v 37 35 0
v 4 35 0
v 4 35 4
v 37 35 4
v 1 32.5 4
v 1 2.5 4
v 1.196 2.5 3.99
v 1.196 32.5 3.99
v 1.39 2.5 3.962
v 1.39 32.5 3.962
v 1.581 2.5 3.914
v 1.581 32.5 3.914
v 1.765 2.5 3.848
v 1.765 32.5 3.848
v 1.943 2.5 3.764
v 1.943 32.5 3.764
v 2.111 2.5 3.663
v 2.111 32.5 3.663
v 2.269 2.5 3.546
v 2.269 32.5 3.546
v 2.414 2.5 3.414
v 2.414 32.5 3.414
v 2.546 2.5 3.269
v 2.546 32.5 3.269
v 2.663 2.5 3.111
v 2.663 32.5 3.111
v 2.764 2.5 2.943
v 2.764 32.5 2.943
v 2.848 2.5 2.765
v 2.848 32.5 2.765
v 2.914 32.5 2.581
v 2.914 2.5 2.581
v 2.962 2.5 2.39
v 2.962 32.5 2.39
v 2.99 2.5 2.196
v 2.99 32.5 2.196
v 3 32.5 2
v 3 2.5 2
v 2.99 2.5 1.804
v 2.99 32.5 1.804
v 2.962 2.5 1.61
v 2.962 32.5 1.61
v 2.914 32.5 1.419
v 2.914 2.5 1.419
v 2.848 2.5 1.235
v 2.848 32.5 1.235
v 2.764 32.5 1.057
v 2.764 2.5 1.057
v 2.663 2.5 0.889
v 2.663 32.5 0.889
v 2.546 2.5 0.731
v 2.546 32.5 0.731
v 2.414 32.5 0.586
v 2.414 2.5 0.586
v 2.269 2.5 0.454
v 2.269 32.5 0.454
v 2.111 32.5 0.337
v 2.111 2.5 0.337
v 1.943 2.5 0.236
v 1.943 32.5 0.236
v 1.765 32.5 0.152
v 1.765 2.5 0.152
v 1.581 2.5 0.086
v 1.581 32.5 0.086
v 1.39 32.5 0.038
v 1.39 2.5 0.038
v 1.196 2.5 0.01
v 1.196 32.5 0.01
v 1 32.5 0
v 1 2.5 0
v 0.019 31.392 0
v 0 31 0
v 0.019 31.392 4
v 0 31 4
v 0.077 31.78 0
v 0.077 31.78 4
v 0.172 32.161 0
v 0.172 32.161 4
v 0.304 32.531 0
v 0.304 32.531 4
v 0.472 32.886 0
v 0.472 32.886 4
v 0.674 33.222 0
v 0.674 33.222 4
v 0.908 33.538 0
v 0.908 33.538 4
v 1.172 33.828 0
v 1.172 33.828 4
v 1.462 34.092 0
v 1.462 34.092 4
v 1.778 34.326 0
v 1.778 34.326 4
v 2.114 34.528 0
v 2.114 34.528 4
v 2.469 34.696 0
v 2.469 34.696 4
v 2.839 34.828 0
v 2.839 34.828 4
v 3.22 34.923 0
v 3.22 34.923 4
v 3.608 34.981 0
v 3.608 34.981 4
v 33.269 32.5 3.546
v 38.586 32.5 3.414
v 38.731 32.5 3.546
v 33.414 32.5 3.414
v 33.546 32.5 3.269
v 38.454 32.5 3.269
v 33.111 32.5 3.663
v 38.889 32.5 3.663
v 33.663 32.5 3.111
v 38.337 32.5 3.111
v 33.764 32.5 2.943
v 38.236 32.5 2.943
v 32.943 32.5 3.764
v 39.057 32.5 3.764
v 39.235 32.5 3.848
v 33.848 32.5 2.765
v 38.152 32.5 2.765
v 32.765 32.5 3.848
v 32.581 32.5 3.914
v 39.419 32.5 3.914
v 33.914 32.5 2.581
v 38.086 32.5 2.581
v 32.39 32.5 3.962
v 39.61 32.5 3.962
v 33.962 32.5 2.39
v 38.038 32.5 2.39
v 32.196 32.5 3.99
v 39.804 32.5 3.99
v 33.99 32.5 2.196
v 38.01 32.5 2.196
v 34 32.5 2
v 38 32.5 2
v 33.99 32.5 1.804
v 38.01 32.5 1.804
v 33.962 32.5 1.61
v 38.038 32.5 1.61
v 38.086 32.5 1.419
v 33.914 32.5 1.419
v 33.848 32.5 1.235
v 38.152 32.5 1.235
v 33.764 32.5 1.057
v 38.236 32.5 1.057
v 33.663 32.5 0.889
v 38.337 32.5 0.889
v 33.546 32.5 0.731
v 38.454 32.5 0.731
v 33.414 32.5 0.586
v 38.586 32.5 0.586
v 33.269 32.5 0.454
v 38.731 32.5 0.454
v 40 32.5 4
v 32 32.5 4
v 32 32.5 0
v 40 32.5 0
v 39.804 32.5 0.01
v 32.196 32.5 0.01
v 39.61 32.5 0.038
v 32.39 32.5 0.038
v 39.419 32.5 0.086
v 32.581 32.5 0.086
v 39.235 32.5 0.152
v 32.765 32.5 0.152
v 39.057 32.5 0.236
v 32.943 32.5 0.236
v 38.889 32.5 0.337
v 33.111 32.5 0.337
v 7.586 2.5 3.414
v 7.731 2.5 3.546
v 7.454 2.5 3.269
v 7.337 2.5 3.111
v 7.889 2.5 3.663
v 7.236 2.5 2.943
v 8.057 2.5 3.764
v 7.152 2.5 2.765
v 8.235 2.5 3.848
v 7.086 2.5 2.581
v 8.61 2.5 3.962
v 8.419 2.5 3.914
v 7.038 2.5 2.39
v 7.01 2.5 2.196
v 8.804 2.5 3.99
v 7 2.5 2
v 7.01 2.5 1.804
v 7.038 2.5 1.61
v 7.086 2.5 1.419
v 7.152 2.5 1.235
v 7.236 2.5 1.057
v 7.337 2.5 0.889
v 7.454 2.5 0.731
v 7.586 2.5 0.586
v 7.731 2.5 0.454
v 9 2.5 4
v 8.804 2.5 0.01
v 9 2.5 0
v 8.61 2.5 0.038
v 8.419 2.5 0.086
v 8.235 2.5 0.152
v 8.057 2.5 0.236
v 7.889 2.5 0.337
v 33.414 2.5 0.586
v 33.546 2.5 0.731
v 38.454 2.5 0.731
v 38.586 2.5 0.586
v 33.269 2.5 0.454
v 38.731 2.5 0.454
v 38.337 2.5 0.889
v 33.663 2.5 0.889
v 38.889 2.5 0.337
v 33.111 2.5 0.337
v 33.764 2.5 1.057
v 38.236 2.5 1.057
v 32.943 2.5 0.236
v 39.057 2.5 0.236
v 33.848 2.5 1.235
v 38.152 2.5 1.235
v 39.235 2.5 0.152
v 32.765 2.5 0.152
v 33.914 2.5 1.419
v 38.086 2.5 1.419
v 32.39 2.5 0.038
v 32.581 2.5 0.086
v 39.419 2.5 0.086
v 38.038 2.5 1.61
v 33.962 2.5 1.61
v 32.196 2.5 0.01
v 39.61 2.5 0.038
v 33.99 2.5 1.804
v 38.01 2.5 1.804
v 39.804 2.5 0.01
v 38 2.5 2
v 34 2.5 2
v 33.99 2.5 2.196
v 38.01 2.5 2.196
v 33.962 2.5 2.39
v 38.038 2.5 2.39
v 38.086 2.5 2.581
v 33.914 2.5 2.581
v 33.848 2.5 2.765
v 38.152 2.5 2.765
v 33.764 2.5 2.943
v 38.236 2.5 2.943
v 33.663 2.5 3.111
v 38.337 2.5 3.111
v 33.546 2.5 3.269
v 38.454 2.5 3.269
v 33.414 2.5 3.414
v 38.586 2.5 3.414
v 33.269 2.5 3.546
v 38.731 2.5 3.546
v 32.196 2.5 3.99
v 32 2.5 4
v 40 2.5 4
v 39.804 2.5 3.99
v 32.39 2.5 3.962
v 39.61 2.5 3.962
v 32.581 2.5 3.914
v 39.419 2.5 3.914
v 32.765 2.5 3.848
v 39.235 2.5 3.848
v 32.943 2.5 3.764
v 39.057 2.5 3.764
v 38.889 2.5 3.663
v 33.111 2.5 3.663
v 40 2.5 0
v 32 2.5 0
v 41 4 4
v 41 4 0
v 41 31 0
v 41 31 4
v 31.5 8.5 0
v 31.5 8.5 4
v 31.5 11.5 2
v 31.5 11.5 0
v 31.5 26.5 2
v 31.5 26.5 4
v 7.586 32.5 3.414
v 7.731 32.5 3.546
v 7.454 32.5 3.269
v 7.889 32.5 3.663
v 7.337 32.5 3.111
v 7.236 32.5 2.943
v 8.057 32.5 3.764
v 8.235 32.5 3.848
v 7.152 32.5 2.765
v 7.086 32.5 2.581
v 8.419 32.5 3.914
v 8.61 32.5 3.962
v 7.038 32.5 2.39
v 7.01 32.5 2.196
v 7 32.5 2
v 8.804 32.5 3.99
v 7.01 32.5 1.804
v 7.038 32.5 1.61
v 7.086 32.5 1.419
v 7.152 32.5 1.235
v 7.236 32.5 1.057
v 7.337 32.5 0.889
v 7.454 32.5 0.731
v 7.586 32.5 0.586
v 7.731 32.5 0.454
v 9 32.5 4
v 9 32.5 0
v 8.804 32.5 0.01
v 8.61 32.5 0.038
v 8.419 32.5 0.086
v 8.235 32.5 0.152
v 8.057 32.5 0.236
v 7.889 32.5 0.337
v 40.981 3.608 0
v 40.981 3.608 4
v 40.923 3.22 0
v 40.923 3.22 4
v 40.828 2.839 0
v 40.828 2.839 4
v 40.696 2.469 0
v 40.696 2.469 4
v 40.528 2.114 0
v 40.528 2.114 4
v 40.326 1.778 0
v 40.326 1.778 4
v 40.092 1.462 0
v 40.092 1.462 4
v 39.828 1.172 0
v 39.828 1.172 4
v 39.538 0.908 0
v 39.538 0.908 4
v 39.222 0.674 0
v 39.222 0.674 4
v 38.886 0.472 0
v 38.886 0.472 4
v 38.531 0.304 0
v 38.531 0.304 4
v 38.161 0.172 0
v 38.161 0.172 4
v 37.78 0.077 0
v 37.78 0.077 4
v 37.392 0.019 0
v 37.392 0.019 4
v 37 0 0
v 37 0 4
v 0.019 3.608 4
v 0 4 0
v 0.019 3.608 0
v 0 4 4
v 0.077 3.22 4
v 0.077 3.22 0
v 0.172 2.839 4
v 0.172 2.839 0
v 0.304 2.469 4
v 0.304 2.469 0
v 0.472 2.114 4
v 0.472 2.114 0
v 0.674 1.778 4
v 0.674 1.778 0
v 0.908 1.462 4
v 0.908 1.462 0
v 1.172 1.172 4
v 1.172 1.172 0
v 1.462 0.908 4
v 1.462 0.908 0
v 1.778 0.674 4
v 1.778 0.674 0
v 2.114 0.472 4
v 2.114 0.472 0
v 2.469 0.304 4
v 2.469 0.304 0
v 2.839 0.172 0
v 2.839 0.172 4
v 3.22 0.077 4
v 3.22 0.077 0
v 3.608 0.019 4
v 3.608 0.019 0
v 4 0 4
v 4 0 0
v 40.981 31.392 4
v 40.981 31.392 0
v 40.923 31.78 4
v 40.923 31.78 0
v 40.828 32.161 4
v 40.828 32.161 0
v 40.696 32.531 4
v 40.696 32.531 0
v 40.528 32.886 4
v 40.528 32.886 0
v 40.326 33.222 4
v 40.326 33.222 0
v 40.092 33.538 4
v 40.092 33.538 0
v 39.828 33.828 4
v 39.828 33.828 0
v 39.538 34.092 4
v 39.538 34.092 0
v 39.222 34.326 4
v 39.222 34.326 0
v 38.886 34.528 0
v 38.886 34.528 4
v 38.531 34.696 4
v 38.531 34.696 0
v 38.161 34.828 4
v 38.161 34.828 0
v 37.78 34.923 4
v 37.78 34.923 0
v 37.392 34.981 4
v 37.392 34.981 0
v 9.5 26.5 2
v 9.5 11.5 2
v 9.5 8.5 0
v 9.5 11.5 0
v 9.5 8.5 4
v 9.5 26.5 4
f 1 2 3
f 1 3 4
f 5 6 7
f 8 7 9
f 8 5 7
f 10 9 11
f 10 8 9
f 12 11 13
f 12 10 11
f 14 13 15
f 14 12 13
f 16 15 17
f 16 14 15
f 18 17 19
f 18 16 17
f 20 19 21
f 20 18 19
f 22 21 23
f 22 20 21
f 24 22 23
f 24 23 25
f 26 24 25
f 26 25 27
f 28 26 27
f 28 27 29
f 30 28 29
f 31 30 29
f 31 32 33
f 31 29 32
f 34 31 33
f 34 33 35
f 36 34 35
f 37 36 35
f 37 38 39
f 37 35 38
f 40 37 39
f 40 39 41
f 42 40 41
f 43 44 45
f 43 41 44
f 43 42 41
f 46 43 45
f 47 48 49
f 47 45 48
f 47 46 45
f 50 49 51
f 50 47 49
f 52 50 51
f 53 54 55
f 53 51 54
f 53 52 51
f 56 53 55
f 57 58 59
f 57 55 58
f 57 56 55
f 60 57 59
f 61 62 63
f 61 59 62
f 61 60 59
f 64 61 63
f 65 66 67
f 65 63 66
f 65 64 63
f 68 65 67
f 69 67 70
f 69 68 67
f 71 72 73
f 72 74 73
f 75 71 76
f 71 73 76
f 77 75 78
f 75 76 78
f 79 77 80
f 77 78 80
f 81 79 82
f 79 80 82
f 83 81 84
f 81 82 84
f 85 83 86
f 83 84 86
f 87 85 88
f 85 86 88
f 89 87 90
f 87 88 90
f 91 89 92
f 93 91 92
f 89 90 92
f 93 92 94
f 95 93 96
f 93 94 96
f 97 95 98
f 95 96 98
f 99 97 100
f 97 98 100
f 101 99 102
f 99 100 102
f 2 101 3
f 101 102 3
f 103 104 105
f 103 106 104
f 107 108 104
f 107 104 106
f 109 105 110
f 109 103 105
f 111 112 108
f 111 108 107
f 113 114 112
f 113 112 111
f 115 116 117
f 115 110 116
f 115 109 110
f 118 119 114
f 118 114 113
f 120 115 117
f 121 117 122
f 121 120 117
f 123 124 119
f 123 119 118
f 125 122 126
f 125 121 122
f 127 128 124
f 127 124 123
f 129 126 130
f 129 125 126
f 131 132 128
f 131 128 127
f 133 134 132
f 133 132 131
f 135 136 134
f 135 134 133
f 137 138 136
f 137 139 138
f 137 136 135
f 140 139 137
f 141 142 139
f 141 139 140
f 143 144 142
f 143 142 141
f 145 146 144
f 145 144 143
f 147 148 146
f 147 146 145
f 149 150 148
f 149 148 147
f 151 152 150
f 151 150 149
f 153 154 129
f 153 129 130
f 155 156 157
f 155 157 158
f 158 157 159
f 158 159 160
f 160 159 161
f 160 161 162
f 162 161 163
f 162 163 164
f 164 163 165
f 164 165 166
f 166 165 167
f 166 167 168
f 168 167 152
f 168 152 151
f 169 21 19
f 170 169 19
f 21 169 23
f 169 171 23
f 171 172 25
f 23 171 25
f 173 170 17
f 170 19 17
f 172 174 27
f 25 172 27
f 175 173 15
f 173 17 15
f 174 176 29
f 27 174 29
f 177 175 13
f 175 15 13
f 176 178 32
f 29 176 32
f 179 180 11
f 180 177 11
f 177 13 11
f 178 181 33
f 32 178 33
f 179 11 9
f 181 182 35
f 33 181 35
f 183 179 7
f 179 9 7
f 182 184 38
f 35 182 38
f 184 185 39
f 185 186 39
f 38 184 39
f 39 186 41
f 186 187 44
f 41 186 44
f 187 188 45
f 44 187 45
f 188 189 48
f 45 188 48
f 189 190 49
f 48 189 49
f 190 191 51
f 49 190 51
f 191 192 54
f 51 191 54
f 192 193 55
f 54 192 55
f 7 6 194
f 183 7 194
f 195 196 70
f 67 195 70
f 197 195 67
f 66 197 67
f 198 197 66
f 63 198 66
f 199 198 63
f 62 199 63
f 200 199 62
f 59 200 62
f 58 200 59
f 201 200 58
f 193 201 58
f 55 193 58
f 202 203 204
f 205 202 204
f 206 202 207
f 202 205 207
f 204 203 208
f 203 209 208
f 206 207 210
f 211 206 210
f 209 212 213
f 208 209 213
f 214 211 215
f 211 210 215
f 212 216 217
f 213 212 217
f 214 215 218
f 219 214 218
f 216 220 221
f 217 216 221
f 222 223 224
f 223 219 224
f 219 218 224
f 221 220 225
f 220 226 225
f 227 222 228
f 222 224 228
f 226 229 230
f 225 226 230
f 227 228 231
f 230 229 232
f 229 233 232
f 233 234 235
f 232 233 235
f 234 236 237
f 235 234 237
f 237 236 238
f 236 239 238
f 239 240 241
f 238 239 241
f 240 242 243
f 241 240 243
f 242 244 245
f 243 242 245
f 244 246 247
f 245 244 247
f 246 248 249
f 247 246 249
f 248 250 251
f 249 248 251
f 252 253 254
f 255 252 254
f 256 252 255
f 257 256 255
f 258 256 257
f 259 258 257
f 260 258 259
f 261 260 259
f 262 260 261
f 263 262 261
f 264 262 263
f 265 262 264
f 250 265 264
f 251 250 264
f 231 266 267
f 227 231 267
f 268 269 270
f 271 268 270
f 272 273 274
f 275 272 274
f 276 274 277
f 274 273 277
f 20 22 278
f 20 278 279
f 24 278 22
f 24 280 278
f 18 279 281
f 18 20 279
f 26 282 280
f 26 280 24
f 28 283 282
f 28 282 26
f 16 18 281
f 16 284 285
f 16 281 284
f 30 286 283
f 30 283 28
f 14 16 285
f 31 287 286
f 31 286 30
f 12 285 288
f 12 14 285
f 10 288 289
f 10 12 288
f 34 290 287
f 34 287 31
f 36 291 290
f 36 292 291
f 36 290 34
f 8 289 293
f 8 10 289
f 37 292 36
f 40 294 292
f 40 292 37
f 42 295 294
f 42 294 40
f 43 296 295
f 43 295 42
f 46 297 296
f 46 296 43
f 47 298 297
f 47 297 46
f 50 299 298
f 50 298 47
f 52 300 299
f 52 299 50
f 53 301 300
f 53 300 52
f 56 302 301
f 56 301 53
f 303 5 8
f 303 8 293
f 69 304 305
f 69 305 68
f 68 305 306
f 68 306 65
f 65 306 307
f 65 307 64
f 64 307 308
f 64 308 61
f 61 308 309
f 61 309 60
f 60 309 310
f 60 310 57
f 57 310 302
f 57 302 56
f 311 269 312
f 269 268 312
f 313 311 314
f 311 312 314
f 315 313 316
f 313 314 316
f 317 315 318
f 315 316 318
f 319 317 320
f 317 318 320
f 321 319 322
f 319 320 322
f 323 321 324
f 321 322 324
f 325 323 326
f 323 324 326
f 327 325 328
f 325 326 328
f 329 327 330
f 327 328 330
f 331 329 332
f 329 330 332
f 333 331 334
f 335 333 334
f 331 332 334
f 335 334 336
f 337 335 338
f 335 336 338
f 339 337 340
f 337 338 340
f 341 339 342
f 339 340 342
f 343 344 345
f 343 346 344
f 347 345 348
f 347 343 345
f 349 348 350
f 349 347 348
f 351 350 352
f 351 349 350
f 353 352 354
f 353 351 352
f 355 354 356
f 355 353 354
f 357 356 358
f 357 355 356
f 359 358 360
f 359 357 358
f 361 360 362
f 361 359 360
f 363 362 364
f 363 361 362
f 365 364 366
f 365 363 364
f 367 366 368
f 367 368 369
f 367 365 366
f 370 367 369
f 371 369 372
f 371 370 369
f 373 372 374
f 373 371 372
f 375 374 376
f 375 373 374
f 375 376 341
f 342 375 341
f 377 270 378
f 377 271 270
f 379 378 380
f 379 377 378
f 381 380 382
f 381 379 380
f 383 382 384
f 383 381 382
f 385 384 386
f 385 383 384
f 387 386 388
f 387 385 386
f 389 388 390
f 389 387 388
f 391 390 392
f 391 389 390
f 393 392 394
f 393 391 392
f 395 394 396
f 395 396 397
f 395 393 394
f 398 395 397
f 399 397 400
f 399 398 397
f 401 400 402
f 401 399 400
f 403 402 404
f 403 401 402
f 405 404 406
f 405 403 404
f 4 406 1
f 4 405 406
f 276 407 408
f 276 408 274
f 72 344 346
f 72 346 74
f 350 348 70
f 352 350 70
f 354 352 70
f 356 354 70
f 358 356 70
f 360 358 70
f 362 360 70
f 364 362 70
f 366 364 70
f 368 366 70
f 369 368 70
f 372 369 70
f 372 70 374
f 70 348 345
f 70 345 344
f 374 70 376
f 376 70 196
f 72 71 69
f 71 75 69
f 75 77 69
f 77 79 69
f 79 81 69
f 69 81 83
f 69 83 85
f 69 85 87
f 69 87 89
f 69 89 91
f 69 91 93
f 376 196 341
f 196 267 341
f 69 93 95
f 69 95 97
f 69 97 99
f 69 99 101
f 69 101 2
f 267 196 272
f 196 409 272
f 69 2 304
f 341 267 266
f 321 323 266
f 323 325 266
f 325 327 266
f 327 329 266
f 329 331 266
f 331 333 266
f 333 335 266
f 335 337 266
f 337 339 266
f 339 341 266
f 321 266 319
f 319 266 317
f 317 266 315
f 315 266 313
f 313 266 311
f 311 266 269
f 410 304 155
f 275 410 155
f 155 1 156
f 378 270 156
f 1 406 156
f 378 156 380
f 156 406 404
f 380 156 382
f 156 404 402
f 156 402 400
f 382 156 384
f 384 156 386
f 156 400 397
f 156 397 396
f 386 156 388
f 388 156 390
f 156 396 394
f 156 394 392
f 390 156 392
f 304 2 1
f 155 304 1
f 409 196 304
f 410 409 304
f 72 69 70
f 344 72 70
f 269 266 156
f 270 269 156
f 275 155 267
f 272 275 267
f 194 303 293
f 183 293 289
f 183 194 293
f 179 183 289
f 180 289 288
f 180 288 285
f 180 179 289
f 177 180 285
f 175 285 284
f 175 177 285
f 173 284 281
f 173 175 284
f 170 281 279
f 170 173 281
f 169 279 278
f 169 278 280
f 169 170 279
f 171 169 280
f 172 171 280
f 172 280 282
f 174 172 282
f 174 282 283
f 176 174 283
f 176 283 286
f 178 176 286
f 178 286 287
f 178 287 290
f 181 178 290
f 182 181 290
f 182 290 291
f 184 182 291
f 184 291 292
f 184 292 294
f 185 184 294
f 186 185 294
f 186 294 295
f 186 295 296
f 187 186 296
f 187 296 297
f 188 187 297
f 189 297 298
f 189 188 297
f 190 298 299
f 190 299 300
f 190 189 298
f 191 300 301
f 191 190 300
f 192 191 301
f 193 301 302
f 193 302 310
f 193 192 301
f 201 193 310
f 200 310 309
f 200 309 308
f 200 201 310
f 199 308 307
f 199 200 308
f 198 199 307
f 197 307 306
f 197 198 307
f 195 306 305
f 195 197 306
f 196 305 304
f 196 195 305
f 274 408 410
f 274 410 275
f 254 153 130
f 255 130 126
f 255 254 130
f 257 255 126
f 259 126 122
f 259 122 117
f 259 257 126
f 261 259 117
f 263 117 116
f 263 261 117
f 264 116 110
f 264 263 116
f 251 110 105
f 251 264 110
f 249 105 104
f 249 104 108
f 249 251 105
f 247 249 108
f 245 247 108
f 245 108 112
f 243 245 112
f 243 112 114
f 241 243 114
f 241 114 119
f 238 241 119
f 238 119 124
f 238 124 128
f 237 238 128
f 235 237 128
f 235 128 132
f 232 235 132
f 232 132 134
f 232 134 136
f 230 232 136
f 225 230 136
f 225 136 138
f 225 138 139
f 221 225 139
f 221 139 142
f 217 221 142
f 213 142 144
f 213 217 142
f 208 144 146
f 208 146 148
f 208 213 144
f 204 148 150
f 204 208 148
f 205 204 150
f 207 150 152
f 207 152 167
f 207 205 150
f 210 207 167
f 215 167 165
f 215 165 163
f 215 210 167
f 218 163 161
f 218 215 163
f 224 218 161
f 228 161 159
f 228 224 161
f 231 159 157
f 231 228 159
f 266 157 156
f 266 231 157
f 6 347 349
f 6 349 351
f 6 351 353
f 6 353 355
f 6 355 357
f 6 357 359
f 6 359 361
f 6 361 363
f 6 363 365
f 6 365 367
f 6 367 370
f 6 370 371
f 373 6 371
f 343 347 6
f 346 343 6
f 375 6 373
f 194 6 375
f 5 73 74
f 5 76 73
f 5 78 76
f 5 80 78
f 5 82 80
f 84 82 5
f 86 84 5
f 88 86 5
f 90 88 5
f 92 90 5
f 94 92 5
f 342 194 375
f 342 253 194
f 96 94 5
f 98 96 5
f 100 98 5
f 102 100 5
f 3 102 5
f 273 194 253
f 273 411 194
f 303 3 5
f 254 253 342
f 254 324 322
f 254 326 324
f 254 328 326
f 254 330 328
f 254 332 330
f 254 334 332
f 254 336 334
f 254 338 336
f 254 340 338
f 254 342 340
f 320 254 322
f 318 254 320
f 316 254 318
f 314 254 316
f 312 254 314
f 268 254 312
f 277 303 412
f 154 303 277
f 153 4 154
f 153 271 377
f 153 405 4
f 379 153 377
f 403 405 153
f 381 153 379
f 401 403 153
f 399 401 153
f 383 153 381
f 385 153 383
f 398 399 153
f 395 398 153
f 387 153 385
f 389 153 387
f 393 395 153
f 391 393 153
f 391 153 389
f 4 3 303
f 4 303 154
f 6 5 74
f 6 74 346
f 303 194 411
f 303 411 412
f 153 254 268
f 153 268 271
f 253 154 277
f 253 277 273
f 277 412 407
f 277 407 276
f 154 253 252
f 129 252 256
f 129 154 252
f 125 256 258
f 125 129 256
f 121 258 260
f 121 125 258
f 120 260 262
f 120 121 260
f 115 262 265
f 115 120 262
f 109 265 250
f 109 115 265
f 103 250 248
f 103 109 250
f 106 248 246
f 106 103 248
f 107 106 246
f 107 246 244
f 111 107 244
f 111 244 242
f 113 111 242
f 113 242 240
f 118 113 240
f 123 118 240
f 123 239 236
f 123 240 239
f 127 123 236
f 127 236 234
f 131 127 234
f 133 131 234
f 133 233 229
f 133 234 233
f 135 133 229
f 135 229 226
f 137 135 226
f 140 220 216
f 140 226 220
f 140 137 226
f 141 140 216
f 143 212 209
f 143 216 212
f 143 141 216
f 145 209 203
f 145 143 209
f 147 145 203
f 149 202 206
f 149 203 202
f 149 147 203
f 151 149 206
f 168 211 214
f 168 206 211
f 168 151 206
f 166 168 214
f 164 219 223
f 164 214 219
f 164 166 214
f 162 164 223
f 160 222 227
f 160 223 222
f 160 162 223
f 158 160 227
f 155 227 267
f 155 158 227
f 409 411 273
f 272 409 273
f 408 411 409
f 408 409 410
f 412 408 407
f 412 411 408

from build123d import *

# Parameters (mm, degrees)
ESQUISSE1_W             = 41
ESQUISSE1_H             = 35
BOSS_EXTRU_1_DEPTH      = 4
ESQUISSE2_W             = 22
ESQUISSE2_H             = 18
ENL_V_MAT_EXTRU_1_DEPTH = 2
ESQUISSE3_W             = 4
ESQUISSE3_H             = 30
ESQUISSE3_W_2           = 22
ESQUISSE3_H_2           = 3
ENL_V_MAT_EXTRU_2_DEPTH = 6
CONG_4_R                = 4
CONG_6_RADIUS           = 2
CONG_6_LENGTH           = 30
CONG_7_RADIUS           = 2
CONG_7_LENGTH           = 30
CONG_8_RADIUS           = 2
CONG_8_LENGTH           = 30
CONG_9_RADIUS           = 2
CONG_9_LENGTH           = 30


with BuildPart() as part:
    # Esquisse1 → Boss.-Extru.1 (new body)
    with BuildSketch(Plane.XY):
        with Locations((20.5, 17.5)):
            Rectangle(ESQUISSE1_W, ESQUISSE1_H)
    extrude(amount=BOSS_EXTRU_1_DEPTH)

    # Esquisse2 → Enlèv. mat.-Extru.1 (cut)
    with BuildSketch(Plane.XY.offset(4)):
        with Locations((20.5, 17.5)):
            Rectangle(ESQUISSE2_W, ESQUISSE2_H)
    extrude(amount=-ENL_V_MAT_EXTRU_1_DEPTH, mode=Mode.SUBTRACT)

    # Esquisse3 → Enlèv. mat.-Extru.2 (cut)
    with BuildSketch(Plane.XY.offset(4)):
        with Locations((5, 17.5)):
            Rectangle(ESQUISSE3_W, ESQUISSE3_H)
        with Locations((36, 17.5)):
            Rectangle(ESQUISSE3_W, ESQUISSE3_H)
        with Locations((20.5, 10)):
            Rectangle(ESQUISSE3_W_2, ESQUISSE3_H_2)
    extrude(amount=-ENL_V_MAT_EXTRU_2_DEPTH, mode=Mode.SUBTRACT)

    # Congé4
    cong_4_edges = [part.edges().sort_by_distance(p)[0] for p in [
        (0, 35, 2),
        (41, 35, 2),
        (41, 0, 2),
        (0, 0, 2),
    ]]
    fillet(cong_4_edges, radius=CONG_4_R)

    # Congé6: full round fillet: the end face becomes a half cylinder, R = half its width
    cong_6_face = Plane((38, 17.5, 2), x_dir=(0, -1, 0), z_dir=(-1, 0, 0))  # on the end face: x along it, z out of the body
    cong_6_slab = cong_6_face.offset(-CONG_6_RADIUS / 2) * Box(CONG_6_LENGTH, 2 * CONG_6_RADIUS, CONG_6_RADIUS, mode=Mode.PRIVATE)  # the body's end, R deep
    cong_6_round = Plane((40, 17.5, 2), x_dir=(-1, 0, 0), z_dir=(0, -1, 0)) * Cylinder(CONG_6_RADIUS, CONG_6_LENGTH, mode=Mode.PRIVATE)  # its axis R under the face
    add(cong_6_slab - cong_6_round, mode=Mode.SUBTRACT)

    # Congé7: full round fillet: the end face becomes a half cylinder, R = half its width
    cong_7_face = Plane((3, 17.5, 2), x_dir=(0, 1, 0), z_dir=(1, 0, 0))  # on the end face: x along it, z out of the body
    cong_7_slab = cong_7_face.offset(-CONG_7_RADIUS / 2) * Box(CONG_7_LENGTH, 2 * CONG_7_RADIUS, CONG_7_RADIUS, mode=Mode.PRIVATE)  # the body's end, R deep
    cong_7_round = Plane((1, 17.5, 2), x_dir=(1, 0, 0), z_dir=(0, 1, 0)) * Cylinder(CONG_7_RADIUS, CONG_7_LENGTH, mode=Mode.PRIVATE)  # its axis R under the face
    add(cong_7_slab - cong_7_round, mode=Mode.SUBTRACT)

    # Congé8: full round fillet: the end face becomes a half cylinder, R = half its width
    cong_8_face = Plane((34, 17.5, 2), x_dir=(0, 1, 0), z_dir=(1, 0, 0))  # on the end face: x along it, z out of the body
    cong_8_slab = cong_8_face.offset(-CONG_8_RADIUS / 2) * Box(CONG_8_LENGTH, 2 * CONG_8_RADIUS, CONG_8_RADIUS, mode=Mode.PRIVATE)  # the body's end, R deep
    cong_8_round = Plane((32, 17.5, 2), x_dir=(1, 0, 0), z_dir=(0, 1, 0)) * Cylinder(CONG_8_RADIUS, CONG_8_LENGTH, mode=Mode.PRIVATE)  # its axis R under the face
    add(cong_8_slab - cong_8_round, mode=Mode.SUBTRACT)

    # Congé9: full round fillet: the end face becomes a half cylinder, R = half its width
    cong_9_face = Plane((7, 17.5, 2), x_dir=(0, -1, 0), z_dir=(-1, 0, 0))  # on the end face: x along it, z out of the body
    cong_9_slab = cong_9_face.offset(-CONG_9_RADIUS / 2) * Box(CONG_9_LENGTH, 2 * CONG_9_RADIUS, CONG_9_RADIUS, mode=Mode.PRIVATE)  # the body's end, R deep
    cong_9_round = Plane((9, 17.5, 2), x_dir=(-1, 0, 0), z_dir=(0, -1, 0)) * Cylinder(CONG_9_RADIUS, CONG_9_LENGTH, mode=Mode.PRIVATE)  # its axis R under the face
    add(cong_9_slab - cong_9_round, mode=Mode.SUBTRACT)


solid = part.part
